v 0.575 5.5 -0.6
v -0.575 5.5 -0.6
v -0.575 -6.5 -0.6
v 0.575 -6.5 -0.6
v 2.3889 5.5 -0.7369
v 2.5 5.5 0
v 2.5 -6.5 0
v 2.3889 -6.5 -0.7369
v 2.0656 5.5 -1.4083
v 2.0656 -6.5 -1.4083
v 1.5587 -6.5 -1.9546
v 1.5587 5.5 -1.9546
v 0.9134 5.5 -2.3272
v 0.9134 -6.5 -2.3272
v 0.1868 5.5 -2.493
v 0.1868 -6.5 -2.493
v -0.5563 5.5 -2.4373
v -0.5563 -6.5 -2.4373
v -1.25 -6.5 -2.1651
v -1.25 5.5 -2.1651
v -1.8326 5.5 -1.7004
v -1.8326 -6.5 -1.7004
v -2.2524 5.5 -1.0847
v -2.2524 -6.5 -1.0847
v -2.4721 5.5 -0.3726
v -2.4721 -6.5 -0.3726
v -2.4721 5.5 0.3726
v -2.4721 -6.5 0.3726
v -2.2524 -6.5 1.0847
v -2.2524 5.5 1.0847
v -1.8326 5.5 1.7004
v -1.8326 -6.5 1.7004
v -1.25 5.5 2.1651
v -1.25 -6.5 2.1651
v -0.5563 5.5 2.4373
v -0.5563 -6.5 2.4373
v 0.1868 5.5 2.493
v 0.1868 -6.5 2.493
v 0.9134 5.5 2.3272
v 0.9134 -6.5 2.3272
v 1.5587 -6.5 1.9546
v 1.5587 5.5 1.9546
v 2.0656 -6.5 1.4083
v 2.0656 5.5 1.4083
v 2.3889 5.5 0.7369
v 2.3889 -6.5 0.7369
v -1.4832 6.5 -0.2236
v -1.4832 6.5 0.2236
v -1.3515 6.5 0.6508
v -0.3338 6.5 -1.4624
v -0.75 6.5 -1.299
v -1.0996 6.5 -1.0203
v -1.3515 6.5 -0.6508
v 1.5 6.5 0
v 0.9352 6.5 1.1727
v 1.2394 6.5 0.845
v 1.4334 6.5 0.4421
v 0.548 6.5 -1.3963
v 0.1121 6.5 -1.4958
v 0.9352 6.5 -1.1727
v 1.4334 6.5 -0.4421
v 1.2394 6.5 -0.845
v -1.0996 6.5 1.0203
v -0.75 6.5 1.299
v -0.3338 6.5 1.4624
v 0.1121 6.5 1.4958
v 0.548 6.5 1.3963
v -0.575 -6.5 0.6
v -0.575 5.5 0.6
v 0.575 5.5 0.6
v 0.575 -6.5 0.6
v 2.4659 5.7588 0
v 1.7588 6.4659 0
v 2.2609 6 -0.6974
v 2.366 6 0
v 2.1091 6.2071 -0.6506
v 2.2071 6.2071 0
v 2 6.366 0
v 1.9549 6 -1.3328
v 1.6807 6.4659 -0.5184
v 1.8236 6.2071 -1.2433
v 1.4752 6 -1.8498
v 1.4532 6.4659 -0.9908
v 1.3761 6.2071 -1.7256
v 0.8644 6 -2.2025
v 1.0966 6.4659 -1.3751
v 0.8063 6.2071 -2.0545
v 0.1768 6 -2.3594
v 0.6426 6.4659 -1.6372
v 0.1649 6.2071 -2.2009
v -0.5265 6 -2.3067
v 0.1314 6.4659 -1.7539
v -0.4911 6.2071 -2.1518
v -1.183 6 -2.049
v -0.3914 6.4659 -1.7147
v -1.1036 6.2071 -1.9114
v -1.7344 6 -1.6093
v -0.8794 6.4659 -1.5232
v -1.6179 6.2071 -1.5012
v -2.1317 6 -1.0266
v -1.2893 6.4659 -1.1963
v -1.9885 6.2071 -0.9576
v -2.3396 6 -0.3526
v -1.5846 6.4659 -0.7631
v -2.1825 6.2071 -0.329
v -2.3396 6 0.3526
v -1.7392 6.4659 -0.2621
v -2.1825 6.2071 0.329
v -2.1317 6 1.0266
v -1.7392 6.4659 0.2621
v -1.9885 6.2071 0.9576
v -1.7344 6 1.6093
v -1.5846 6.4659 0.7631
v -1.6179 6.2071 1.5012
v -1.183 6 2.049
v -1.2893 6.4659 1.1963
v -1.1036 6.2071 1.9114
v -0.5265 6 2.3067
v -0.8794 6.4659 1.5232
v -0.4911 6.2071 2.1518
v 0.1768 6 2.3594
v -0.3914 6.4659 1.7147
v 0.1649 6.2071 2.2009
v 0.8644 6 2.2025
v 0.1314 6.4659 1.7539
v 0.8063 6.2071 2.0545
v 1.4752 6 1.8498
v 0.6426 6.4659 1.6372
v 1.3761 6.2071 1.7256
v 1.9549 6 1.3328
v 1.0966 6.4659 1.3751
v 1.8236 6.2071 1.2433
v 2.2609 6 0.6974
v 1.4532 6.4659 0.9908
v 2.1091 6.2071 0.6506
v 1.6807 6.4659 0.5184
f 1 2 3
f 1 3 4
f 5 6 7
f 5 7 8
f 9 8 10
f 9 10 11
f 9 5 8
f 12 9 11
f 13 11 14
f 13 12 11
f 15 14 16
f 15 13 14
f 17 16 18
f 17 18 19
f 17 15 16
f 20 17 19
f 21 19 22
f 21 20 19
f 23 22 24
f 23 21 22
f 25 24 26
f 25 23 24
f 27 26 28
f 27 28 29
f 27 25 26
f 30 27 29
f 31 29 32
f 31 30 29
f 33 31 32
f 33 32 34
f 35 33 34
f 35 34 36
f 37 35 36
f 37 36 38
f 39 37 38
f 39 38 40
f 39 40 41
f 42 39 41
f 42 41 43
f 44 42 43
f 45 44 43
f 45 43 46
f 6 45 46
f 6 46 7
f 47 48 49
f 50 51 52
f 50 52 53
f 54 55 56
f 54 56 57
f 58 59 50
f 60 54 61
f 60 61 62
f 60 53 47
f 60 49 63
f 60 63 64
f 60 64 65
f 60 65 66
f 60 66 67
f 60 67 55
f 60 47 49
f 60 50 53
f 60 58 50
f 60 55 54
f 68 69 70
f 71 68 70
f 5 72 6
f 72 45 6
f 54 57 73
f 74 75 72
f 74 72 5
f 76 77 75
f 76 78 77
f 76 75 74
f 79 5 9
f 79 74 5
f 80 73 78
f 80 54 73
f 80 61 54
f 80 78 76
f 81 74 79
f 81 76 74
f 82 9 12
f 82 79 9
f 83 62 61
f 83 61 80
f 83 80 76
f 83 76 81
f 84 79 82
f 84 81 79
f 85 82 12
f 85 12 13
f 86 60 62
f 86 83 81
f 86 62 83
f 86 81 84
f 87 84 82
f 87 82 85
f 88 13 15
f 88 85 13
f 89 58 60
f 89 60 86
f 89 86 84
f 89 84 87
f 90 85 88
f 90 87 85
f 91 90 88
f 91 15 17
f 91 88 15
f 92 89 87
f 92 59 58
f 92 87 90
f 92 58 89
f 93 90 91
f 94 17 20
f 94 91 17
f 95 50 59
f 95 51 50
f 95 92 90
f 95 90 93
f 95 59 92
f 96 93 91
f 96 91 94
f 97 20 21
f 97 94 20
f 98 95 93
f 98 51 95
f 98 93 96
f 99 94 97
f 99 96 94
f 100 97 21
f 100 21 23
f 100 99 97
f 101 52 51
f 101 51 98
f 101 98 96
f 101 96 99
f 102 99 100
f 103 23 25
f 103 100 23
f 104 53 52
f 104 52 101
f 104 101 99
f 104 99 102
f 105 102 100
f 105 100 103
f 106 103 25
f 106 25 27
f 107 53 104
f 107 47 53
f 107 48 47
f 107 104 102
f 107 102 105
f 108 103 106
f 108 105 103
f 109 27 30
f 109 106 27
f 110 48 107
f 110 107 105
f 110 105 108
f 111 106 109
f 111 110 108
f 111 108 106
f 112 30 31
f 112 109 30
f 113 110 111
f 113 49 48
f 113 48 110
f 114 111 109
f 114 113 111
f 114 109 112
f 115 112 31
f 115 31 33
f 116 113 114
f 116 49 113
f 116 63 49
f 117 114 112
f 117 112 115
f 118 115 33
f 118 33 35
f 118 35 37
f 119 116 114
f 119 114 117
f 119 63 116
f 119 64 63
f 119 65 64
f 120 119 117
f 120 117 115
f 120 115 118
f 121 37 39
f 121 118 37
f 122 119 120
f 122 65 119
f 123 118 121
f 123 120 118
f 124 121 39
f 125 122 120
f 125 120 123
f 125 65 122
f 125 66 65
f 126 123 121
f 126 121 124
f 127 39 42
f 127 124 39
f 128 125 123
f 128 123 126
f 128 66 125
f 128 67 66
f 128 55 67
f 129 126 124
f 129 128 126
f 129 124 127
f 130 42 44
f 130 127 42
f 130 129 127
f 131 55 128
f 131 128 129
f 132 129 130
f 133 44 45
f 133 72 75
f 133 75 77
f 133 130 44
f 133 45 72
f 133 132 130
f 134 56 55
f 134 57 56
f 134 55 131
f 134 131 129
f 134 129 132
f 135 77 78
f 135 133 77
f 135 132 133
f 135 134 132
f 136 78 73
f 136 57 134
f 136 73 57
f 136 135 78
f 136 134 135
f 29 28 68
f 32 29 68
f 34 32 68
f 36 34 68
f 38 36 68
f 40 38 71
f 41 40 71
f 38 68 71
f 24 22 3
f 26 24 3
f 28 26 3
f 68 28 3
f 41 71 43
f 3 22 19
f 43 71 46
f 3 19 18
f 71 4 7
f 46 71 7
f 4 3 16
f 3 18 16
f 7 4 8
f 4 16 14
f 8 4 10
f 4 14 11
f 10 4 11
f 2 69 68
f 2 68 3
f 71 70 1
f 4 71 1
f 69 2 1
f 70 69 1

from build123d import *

# Parameters (mm, degrees)
SKETCH2_R           = 2.5
SKETCH2_W           = 1.15
SKETCH2_H           = 1.2
BOSS_EXTRUDE1_DEPTH = 6.5
FILLET1_R           = 1
SKETCH3_W           = 1.15
SKETCH3_H           = 1.2
BOSS_EXTRUDE5_DEPTH = 1


with BuildPart() as part:
    # Sketch2 → Boss-Extrude1 (new body, symmetric)
    with BuildSketch(Plane(origin=(0, 0, 0), x_dir=(1, 0, 0), z_dir=(0, 1, 0))):
        Circle(SKETCH2_R)
        Rectangle(SKETCH2_W, SKETCH2_H, mode=Mode.SUBTRACT)
    extrude(amount=BOSS_EXTRUDE1_DEPTH, both=True)

    # Fillet1
    fillet1_edges = [part.edges().sort_by_distance(p)[0] for p in [
        (-2.5, 6.5, 0),
    ]]
    fillet(fillet1_edges, radius=FILLET1_R)

    # Sketch3 → Boss-Extrude5 (add)
    with BuildSketch(Plane(origin=(0, 6.5, 0), x_dir=(1, 0, 0), z_dir=(0, 1, 0))):
        Rectangle(SKETCH3_W, SKETCH3_H)
    extrude(amount=-BOSS_EXTRUDE5_DEPTH)


solid = part.part
